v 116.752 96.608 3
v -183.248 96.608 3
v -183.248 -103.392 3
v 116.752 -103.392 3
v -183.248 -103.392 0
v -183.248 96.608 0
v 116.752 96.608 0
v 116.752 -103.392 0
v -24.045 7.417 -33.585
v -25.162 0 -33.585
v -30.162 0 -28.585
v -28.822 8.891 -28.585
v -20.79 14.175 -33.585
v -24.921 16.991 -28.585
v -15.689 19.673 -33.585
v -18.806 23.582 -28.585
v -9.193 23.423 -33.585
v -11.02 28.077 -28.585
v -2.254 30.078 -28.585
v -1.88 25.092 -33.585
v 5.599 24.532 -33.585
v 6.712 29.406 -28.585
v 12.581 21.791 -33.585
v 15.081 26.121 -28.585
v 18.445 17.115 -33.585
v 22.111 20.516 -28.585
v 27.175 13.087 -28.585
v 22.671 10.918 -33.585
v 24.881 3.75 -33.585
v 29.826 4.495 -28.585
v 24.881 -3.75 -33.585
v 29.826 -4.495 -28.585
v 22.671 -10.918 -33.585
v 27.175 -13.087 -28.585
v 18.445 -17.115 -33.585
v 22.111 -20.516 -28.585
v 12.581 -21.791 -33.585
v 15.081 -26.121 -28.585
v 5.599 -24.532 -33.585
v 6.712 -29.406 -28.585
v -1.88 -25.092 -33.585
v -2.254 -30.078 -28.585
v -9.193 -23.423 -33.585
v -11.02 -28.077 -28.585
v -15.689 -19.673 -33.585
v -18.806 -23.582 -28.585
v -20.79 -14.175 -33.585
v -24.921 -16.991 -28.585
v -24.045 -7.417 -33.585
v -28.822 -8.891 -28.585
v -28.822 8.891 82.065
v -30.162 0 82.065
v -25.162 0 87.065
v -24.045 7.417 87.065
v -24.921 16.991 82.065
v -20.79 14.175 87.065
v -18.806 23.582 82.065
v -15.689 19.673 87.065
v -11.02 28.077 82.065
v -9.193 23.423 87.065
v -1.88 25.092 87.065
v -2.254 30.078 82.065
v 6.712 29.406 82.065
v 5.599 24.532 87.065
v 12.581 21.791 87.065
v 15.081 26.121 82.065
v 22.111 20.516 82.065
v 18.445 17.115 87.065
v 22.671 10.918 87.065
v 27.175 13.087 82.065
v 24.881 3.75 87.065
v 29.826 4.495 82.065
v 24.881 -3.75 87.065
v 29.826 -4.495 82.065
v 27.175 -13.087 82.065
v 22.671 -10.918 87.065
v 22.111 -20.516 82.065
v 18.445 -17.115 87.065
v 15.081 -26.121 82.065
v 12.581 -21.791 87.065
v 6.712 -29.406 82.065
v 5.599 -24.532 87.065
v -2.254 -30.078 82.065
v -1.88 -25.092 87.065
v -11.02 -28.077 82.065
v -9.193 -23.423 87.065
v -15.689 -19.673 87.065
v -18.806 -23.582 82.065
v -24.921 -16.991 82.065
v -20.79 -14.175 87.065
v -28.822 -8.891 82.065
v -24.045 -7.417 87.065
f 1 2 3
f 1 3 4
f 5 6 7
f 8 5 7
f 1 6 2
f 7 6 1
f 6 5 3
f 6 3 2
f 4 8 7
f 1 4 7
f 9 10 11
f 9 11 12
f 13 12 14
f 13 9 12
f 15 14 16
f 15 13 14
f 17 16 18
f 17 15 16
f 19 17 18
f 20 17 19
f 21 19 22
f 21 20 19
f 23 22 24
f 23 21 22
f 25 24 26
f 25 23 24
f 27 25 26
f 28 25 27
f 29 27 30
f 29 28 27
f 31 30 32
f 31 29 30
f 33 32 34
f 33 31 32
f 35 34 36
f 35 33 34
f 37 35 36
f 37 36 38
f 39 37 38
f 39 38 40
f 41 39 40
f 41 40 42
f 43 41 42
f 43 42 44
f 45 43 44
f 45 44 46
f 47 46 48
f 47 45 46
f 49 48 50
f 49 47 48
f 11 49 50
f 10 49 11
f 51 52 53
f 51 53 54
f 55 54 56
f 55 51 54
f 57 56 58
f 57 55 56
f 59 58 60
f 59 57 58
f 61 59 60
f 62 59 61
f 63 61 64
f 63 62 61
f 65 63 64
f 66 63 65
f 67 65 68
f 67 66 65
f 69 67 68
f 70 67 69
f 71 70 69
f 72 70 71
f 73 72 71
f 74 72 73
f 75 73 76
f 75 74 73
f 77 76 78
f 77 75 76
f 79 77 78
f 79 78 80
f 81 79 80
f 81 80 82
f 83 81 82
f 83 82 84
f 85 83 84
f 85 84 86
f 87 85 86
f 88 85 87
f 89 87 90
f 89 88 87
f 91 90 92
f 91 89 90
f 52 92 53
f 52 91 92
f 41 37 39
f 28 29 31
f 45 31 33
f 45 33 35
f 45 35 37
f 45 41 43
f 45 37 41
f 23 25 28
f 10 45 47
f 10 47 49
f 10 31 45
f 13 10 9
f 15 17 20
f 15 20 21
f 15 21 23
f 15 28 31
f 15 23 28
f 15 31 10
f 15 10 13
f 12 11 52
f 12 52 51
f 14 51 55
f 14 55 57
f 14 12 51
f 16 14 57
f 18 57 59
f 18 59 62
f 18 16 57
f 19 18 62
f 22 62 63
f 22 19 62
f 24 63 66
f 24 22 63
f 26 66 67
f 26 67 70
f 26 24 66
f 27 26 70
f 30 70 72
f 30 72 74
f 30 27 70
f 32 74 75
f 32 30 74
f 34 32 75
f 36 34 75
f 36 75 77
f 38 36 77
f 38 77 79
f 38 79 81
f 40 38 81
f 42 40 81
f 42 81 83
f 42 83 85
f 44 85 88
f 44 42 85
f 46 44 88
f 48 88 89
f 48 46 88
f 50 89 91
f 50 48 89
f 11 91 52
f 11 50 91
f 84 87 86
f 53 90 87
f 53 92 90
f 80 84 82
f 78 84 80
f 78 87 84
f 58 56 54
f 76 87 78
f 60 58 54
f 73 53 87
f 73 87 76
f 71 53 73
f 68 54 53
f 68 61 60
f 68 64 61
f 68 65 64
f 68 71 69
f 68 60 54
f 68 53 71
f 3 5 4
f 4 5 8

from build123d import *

# Parameters (mm, degrees)
F2_SIZE  = 5
F3_W     = 300
F3_H     = 200
F4_DEPTH = 3


with BuildPart() as f1:
    # F0 (on Front) → F1 (revolve)
    with BuildSketch(Plane.XZ):
        Polygon((0, -33.58452), (0, 0), (0, 87.06548), (-30.1625, 87.06548), (-30.1625, -33.58452), align=None)
    revolve(axis=Axis((0, 0, 43.53274), (0, 0, -1)))

    # F2
    f2_edges = [f1.edges().sort_by_distance(p)[0] for p in [
        (30.1625, 0, 87.06548),
        (30.1625, 0, -33.58452),
    ]]
    chamfer(f2_edges, length=F2_SIZE)


with BuildPart() as f4:
    # F3 (on Top) → F4 (new body)
    with BuildSketch(Plane.XY):
        with Locations((-33.24757, -3.391966)):
            Rectangle(F3_W, F3_H)
    extrude(amount=F4_DEPTH)


solid = Compound([f1.part, f4.part])
